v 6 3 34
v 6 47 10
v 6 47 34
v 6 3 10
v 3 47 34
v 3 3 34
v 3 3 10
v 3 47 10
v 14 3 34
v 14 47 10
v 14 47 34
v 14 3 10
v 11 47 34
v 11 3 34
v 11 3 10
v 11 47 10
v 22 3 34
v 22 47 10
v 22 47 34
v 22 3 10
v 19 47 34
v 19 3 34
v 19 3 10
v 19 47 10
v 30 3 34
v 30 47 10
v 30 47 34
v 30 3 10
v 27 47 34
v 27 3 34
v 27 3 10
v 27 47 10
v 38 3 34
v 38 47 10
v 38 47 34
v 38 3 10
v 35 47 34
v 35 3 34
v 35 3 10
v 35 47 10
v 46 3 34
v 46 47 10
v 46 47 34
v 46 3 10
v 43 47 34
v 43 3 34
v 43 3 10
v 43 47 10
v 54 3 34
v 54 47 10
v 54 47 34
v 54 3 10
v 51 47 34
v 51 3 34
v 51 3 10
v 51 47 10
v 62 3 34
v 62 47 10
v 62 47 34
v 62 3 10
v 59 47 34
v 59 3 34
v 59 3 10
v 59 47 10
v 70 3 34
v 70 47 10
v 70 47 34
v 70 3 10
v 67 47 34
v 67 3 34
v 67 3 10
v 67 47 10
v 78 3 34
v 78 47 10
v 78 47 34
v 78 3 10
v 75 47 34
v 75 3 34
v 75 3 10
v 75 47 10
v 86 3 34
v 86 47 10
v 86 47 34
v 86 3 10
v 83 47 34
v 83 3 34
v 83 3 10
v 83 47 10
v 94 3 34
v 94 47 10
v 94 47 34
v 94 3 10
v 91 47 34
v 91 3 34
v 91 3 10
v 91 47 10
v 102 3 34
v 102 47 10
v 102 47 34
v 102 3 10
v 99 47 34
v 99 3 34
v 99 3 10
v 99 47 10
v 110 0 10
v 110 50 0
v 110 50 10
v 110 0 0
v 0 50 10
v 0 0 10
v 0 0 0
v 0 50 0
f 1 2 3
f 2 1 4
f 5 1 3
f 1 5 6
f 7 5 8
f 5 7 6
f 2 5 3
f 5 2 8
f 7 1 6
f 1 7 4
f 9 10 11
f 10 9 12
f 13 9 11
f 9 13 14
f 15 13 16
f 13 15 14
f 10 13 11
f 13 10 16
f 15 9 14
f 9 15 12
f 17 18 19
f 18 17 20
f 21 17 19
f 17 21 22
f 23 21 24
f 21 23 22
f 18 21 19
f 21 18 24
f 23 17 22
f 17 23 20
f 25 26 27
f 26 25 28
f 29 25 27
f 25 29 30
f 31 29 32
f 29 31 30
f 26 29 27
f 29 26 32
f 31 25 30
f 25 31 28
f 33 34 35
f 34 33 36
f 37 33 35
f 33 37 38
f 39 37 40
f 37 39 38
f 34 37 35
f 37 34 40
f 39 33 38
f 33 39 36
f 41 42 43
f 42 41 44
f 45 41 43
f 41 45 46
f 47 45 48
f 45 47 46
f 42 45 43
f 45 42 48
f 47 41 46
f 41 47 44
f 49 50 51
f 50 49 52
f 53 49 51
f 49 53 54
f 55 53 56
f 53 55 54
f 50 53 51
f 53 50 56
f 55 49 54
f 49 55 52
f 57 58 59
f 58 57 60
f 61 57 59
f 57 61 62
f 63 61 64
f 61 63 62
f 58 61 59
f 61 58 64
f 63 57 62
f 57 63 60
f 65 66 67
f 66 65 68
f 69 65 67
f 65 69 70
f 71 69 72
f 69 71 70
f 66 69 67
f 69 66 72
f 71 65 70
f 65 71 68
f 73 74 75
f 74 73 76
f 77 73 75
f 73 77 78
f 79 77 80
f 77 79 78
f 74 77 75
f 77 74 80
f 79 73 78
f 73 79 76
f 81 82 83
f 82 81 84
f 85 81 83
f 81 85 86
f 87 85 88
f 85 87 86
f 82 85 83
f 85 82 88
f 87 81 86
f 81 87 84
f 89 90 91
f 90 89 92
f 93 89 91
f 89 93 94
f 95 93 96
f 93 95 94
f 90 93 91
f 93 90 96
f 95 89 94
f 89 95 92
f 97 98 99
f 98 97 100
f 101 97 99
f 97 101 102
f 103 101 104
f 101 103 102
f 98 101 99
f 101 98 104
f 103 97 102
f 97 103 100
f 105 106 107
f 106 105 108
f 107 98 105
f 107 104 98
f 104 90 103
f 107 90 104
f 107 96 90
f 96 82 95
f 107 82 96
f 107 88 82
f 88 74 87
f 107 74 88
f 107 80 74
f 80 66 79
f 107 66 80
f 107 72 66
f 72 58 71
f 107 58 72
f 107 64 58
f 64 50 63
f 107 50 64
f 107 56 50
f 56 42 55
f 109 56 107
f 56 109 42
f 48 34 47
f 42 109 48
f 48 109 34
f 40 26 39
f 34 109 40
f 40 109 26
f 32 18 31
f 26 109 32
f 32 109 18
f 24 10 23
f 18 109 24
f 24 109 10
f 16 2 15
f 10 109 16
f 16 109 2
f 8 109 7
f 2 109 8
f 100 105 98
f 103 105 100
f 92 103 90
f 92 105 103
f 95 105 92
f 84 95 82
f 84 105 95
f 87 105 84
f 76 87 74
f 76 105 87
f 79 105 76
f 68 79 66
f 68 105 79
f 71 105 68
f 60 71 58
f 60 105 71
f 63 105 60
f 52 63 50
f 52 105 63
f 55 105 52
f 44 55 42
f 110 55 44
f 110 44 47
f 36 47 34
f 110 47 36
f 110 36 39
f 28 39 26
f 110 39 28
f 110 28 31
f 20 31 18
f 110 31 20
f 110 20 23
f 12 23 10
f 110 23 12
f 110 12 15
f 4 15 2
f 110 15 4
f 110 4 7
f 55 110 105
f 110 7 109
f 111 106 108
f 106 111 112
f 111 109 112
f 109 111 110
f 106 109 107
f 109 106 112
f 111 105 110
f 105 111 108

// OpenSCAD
$fn = 32;

// ----------------------------------------------------------------------
// Heatsink: uniform fin block
// ----------------------------------------------------------------------

// --- parameters (mm) ---
base_l = 110;             // base length, X
base_w = 50;              // base width, Y
base_t = 10;              // base plate thickness
fin_h = 25;               // fin height above the base
fin_t = 3;                // fin thickness
edge = 3;                 // margin from the base ends
pitch = 8;                // fin pitch
fit_tol = 0.05;           // tolerance for press fits, mm
free_tol = 0.2;           // tolerance for clearance fits, mm

n_fins = floor((base_l - 2 * edge - fin_t) / pitch) + 1;  // fin count
total_h = base_t + fin_h - 1;  // overall height

union() {
  cube([base_l, base_w, base_t]);
  for (i = [0 : n_fins - 1])
    translate([edge + i * pitch, edge, base_t - 1])
      cube([fin_t, base_w - 2 * edge, fin_h]);
}
